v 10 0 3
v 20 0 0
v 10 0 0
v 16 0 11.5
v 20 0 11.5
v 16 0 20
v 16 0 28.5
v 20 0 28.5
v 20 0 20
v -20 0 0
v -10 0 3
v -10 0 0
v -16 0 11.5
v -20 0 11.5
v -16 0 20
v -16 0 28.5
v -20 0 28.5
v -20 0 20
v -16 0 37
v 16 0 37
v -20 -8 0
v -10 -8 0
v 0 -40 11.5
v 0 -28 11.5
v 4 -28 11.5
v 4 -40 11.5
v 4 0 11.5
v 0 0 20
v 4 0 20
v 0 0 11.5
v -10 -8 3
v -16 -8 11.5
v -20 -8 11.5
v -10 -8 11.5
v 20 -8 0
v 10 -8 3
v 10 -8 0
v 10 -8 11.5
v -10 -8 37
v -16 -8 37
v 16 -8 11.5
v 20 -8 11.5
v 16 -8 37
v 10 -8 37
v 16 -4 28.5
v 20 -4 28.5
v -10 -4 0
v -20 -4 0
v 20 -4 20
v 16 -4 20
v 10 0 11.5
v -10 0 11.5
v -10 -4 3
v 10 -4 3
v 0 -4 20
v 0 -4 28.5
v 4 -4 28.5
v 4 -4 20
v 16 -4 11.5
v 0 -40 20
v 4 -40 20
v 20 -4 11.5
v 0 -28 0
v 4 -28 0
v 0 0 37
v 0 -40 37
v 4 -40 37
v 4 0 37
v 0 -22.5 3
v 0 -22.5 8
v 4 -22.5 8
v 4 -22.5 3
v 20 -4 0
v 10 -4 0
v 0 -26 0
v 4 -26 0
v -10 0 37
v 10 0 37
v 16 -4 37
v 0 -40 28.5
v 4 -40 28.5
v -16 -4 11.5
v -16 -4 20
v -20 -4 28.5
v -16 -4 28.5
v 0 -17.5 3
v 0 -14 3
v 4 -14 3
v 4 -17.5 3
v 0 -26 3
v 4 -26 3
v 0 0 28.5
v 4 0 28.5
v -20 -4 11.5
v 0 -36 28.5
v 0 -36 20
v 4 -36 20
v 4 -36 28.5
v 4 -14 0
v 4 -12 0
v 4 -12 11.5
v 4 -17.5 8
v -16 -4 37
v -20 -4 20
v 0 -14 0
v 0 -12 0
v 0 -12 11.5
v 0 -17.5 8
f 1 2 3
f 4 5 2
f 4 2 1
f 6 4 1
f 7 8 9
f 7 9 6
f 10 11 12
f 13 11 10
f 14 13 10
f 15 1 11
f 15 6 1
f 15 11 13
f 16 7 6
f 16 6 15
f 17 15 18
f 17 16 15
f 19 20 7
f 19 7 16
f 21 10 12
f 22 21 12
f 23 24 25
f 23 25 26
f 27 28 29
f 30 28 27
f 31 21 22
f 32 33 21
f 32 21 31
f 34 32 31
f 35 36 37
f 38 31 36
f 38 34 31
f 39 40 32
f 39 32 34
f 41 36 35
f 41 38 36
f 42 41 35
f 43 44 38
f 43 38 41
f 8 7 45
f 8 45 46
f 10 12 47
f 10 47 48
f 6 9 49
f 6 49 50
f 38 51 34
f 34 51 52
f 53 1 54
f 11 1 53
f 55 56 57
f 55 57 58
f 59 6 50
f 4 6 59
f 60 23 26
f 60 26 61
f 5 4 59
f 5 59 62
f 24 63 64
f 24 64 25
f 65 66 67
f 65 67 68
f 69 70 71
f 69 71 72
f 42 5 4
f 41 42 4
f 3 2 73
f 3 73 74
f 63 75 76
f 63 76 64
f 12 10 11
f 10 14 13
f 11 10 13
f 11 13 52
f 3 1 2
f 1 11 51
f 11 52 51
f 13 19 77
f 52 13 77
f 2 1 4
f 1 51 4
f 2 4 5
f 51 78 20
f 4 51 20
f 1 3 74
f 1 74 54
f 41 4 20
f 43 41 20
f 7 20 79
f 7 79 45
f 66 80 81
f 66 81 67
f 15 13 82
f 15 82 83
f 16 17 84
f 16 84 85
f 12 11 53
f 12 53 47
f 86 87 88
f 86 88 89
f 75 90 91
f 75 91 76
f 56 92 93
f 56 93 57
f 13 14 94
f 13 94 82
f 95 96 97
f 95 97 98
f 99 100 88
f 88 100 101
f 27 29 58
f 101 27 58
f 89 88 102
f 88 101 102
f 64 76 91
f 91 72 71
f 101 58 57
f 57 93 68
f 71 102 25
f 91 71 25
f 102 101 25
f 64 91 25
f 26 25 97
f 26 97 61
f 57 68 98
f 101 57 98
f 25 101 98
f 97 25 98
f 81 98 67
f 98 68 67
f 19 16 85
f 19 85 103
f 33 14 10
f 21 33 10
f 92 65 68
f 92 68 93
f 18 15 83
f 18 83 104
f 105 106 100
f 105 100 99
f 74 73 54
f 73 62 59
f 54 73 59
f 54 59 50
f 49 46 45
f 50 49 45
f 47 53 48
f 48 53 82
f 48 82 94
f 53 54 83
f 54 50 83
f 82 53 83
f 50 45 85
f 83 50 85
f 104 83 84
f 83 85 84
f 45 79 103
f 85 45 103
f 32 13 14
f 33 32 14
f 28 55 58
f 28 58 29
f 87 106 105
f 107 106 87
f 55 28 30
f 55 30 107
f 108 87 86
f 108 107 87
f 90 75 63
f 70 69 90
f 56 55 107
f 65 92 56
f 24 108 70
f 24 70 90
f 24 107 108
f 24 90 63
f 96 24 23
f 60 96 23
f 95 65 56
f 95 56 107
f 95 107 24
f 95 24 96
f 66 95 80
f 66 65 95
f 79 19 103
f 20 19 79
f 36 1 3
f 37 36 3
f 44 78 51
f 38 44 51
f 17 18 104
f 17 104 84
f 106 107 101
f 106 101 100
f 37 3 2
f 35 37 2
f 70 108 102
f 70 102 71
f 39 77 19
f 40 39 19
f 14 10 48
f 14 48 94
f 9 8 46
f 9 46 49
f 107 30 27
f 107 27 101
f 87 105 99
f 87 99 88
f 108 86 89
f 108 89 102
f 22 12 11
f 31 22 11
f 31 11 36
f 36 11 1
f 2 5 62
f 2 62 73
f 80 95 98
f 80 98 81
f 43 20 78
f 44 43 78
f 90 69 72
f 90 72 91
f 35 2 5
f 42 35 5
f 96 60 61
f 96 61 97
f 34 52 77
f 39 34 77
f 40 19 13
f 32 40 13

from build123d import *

# Parameters (mm, degrees)
PAD_DEPTH    = 4
PAD001_DEPTH = 4
PAD002_DEPTH = 8


with BuildPart() as frontwall:
    # Sketch → Pad (new body)
    with BuildSketch(Plane.XZ):
        Polygon((-16, 37), (16, 37), (16, 28.5), (20, 28.5), (20, 20), (16, 20), (16, 11.5), (20, 11.5), (20, 0), (10, 0), (10, 3), (-10, 3), (-10, 0), (-20, 0), (-20, 11.5), (-16, 11.5), (-16, 20), (-20, 20), (-20, 28.5), (-16, 28.5), align=None)
    extrude(amount=PAD_DEPTH)


with BuildPart() as sidewall:
    # Sketch001 → Pad001 (new body)
    with BuildSketch(Plane.YZ):
        Polygon((0, 37), (0, 28.5), (-4, 28.5), (-4, 20), (0, 20), (0, 11.5), (-12, 11.5), (-12, 0), (-14, 0), (-14, 3), (-17.5, 3), (-17.5, 8), (-22.5, 8), (-22.5, 3), (-26, 3), (-26, 0), (-28, 0), (-28, 11.5), (-40, 11.5), (-40, 20), (-36, 20), (-36, 28.5), (-40, 28.5), (-40, 37), align=None)
    extrude(amount=PAD001_DEPTH)


with BuildPart() as support:
    # Sketch002 → Pad002 (new body)
    with BuildSketch(Plane.XZ):
        Polygon((-20, 11.5), (-20, 0), (-10, 0), (-10, 3), (10, 3), (10, 0), (20, 0), (20, 11.5), (16, 11.5), (16, 37), (10, 37), (10, 11.5), (-10, 11.5), (-10, 37), (-16, 37), (-16, 11.5), align=None)
    extrude(amount=PAD002_DEPTH)


solid = Compound([frontwall.part, sidewall.part, support.part])
